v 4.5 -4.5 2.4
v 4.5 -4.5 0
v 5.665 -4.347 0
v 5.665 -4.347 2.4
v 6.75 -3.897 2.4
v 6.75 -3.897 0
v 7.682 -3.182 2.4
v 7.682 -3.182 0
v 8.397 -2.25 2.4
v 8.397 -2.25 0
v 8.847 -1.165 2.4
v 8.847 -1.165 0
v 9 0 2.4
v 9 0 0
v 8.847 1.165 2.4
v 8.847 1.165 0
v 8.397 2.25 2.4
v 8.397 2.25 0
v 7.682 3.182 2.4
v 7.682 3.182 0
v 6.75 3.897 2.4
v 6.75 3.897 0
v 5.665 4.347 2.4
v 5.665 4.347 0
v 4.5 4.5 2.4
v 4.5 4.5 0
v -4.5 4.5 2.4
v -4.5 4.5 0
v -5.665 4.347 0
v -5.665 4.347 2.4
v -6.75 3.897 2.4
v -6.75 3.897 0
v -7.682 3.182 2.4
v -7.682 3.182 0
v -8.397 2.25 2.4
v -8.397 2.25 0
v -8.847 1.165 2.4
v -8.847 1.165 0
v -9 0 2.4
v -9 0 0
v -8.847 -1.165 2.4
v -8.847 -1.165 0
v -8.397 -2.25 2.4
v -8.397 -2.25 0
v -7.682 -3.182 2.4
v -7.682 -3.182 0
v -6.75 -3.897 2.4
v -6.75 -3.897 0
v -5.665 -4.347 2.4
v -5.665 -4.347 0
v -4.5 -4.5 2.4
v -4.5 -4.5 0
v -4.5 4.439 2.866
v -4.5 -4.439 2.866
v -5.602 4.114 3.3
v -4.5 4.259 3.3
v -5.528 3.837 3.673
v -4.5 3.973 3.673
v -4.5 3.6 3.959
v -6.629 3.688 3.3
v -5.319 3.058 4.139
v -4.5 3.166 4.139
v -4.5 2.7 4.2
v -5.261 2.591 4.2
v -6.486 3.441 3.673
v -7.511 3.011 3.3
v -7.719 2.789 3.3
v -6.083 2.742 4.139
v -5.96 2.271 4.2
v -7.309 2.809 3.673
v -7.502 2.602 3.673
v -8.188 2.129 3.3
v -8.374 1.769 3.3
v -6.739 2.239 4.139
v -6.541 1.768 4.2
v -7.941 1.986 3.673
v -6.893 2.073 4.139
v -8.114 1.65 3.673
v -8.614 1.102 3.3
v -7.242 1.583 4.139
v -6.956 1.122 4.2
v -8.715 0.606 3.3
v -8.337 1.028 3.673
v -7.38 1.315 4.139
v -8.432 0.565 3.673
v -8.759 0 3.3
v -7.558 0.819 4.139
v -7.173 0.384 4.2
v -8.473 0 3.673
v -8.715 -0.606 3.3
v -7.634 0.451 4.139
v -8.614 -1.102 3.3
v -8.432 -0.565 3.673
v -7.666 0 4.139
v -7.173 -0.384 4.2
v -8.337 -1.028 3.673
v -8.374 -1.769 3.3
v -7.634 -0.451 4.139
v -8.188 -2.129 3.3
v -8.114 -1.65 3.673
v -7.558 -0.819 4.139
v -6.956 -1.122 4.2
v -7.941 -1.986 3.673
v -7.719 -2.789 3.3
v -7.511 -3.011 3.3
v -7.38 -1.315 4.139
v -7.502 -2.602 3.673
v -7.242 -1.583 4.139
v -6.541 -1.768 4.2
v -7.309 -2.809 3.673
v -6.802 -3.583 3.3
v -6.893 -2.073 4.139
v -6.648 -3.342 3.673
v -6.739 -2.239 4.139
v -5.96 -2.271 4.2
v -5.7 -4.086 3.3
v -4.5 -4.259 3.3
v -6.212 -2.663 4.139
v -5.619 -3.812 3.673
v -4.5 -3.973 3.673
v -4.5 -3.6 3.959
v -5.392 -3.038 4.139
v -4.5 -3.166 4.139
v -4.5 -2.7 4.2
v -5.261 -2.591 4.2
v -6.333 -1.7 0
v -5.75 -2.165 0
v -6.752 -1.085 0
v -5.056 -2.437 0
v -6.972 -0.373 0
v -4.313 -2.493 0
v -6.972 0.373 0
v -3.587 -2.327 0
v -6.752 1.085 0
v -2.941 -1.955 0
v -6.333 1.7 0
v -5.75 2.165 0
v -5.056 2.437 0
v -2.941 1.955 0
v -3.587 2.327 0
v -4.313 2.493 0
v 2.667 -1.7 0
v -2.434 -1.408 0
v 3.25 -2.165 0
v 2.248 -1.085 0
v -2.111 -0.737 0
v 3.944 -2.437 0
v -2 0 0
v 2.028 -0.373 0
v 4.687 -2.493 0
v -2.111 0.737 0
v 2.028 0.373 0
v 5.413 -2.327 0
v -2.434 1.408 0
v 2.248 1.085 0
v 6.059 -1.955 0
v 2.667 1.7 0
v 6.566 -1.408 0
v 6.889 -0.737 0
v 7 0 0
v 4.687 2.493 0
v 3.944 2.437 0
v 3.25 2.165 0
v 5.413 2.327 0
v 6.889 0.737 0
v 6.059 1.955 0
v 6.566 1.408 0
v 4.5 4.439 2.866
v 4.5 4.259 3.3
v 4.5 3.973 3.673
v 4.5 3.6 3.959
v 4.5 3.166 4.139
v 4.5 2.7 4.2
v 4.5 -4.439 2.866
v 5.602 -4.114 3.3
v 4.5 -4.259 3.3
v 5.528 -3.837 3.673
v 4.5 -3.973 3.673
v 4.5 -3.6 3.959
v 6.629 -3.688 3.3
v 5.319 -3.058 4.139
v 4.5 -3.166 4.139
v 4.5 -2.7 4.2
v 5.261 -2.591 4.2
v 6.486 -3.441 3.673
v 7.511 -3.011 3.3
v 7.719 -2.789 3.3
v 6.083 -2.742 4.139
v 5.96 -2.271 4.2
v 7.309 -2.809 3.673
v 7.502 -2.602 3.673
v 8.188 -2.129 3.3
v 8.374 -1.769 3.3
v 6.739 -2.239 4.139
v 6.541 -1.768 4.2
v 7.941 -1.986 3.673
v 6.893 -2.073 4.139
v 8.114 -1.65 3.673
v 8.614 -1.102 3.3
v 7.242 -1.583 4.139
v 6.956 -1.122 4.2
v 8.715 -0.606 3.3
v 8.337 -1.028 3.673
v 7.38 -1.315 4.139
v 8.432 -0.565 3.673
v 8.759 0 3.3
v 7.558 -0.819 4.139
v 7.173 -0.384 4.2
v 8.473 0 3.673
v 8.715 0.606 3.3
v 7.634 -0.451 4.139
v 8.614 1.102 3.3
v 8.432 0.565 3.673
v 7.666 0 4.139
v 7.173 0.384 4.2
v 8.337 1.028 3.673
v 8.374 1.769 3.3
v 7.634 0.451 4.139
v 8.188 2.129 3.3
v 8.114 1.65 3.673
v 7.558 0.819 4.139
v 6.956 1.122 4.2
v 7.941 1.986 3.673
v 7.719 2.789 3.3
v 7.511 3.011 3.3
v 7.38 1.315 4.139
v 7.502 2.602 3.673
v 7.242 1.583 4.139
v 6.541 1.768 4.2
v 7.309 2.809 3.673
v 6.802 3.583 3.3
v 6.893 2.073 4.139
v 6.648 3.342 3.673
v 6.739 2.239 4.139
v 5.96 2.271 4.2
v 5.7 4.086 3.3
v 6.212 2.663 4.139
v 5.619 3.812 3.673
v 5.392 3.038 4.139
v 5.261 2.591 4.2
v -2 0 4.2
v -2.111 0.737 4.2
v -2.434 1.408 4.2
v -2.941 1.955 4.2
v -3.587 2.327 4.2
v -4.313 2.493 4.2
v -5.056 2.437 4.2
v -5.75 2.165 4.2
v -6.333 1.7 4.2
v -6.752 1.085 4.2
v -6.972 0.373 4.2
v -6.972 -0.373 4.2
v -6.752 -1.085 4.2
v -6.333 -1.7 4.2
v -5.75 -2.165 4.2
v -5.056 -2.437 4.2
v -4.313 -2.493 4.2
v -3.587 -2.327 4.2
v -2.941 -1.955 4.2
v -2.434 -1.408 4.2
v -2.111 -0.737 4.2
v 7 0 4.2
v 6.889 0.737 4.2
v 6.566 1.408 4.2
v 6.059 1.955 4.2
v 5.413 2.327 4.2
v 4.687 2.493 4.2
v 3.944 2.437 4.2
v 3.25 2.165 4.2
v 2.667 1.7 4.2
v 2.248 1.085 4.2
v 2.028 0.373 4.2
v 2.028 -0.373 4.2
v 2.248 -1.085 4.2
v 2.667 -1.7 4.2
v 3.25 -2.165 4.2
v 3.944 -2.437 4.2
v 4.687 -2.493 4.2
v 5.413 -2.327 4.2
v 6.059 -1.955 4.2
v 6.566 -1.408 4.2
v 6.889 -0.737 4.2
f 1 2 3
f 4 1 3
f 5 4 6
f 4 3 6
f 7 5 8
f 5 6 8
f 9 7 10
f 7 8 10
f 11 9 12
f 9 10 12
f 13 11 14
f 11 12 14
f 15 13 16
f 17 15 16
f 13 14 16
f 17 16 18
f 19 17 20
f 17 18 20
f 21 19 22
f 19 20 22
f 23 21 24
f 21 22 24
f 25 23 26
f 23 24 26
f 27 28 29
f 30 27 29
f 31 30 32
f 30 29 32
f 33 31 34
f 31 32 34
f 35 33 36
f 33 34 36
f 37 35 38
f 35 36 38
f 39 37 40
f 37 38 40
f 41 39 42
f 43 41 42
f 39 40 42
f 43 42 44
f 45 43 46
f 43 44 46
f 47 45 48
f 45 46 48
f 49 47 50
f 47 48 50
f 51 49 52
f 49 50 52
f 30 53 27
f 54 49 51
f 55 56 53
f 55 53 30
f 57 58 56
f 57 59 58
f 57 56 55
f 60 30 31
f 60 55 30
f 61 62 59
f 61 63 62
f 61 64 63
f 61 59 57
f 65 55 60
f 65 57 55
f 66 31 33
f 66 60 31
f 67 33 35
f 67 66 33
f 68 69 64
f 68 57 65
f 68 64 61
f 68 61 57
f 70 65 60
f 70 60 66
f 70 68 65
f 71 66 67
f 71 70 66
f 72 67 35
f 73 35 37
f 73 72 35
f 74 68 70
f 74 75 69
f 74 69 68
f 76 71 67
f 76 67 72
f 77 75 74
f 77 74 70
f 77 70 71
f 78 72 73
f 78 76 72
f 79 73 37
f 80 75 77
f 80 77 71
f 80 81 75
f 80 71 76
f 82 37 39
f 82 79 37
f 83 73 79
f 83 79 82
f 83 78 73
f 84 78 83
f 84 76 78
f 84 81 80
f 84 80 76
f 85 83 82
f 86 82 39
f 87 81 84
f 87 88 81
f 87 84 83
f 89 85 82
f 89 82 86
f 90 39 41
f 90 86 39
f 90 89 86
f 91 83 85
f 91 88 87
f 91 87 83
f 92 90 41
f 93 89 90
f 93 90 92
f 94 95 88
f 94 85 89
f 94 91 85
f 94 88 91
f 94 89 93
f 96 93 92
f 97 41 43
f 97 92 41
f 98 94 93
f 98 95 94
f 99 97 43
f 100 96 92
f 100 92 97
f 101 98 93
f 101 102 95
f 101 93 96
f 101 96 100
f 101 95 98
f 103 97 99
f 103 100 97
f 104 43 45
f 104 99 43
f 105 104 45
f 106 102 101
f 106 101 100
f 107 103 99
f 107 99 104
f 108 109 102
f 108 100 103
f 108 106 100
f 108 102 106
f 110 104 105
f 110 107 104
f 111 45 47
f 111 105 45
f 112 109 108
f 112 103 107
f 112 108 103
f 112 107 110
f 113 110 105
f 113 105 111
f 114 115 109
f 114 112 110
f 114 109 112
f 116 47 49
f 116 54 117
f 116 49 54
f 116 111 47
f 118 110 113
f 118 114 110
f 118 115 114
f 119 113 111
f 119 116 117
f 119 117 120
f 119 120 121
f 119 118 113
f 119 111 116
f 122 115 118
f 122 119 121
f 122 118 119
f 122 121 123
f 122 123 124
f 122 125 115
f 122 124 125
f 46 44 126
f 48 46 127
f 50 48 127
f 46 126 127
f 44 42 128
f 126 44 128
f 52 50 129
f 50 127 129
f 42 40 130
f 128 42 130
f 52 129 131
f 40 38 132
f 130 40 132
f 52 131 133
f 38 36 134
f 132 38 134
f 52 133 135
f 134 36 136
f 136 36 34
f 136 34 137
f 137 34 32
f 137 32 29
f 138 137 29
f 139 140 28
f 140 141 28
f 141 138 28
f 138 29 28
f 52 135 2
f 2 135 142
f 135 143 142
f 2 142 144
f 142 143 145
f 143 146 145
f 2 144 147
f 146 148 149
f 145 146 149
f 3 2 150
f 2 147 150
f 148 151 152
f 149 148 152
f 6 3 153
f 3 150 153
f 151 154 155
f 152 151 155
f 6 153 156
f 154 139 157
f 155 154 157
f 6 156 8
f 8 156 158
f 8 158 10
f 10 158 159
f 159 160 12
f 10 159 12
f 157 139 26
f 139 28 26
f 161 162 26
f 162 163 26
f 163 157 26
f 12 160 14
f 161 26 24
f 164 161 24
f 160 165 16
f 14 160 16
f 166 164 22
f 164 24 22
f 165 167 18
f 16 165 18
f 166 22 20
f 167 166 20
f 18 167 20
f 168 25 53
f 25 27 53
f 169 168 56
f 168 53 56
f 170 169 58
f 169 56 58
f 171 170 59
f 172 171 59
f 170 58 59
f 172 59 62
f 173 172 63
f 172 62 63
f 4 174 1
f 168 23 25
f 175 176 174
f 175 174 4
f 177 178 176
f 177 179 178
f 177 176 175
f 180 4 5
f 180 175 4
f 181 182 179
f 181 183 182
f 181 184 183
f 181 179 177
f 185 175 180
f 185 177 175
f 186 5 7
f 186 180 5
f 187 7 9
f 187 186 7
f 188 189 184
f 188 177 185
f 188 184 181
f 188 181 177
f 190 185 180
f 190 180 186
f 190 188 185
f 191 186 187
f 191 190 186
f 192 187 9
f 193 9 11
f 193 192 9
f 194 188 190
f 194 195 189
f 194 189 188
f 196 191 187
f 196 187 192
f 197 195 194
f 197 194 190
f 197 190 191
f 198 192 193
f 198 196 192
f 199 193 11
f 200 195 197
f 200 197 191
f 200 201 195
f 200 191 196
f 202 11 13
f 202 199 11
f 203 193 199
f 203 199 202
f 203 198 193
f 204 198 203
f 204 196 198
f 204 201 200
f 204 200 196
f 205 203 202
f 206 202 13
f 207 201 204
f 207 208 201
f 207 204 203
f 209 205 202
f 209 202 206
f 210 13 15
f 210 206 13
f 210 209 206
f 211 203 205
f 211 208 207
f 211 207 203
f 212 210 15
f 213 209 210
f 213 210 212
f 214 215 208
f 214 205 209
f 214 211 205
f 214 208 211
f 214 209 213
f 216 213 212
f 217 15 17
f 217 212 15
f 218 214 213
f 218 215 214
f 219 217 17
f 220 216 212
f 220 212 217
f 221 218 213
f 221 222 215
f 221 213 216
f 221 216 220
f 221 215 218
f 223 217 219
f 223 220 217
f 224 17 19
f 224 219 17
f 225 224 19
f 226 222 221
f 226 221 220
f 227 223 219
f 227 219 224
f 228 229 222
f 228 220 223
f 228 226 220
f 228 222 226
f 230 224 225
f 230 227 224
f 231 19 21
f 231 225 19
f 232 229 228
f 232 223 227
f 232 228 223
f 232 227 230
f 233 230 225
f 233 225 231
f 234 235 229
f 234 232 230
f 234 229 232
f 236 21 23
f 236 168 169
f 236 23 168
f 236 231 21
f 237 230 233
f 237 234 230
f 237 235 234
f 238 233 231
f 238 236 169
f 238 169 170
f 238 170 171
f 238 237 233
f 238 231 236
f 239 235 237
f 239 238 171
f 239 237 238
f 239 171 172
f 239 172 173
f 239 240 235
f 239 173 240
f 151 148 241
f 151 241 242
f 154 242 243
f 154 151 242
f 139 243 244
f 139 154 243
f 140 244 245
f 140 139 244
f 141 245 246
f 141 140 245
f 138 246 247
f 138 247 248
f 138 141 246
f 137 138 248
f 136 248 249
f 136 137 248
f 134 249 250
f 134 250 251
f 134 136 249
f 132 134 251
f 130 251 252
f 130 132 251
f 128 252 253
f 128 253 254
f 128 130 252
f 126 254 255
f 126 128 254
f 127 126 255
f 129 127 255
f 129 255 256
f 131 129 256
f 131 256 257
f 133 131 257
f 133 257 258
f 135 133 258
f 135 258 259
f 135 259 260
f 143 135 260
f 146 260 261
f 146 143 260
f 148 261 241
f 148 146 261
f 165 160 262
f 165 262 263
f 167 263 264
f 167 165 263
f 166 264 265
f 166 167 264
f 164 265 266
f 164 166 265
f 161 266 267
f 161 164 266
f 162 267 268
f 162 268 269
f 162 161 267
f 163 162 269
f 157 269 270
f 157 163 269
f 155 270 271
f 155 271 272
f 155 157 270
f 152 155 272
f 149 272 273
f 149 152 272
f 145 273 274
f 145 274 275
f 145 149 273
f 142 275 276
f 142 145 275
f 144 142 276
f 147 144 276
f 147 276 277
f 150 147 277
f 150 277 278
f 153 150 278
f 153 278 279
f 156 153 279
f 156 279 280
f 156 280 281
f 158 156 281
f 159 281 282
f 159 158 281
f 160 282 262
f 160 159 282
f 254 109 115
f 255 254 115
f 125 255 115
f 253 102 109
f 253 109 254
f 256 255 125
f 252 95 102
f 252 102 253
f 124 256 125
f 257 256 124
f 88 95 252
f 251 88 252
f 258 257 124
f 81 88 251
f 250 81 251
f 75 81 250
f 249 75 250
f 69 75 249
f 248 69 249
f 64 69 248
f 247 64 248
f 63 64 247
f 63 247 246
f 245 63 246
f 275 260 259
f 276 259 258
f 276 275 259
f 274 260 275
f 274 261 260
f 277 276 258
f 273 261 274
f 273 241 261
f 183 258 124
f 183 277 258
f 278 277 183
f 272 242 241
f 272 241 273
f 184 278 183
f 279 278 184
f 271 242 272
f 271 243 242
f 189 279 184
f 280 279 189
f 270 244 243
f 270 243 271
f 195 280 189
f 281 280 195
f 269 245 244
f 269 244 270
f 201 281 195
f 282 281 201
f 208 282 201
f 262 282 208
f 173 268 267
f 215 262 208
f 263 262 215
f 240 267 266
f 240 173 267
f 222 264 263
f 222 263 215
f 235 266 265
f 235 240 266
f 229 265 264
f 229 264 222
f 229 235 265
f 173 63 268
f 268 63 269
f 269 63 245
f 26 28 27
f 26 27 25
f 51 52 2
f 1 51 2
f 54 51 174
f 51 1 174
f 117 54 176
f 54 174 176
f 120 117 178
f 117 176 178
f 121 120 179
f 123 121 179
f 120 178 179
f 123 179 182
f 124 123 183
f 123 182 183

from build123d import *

# Parameters (mm, degrees)
SKETCH_R  = 2.5
PAD_DEPTH = 4.2
FILLET_R  = 1.8


with BuildPart() as part:
    # Sketch → Pad (new body)
    with BuildSketch(Plane.XY):
        with BuildLine():
            ThreePointArc((-4.5, 4.5), (-9, -1.4e-05), (-4.499972, -4.5))
            Line((-4.499972, -4.5), (4.5, -4.5))
            ThreePointArc((4.5, -4.5), (9, 1.4e-05), (4.499972, 4.5))
            Line((-4.5, 4.5), (4.499972, 4.5))
        make_face()
        with Locations((-4.5, 0)):
            Circle(SKETCH_R, mode=Mode.SUBTRACT)
        with Locations((4.5, 0)):
            Circle(SKETCH_R, mode=Mode.SUBTRACT)
    extrude(amount=PAD_DEPTH)

    # Fillet
    fillet_edges = [part.edges().sort_by_distance(p)[0] for p in [
        (9, 1.4e-05, 4.2),
    ]]
    fillet(fillet_edges, radius=FILLET_R)


solid = part.part
